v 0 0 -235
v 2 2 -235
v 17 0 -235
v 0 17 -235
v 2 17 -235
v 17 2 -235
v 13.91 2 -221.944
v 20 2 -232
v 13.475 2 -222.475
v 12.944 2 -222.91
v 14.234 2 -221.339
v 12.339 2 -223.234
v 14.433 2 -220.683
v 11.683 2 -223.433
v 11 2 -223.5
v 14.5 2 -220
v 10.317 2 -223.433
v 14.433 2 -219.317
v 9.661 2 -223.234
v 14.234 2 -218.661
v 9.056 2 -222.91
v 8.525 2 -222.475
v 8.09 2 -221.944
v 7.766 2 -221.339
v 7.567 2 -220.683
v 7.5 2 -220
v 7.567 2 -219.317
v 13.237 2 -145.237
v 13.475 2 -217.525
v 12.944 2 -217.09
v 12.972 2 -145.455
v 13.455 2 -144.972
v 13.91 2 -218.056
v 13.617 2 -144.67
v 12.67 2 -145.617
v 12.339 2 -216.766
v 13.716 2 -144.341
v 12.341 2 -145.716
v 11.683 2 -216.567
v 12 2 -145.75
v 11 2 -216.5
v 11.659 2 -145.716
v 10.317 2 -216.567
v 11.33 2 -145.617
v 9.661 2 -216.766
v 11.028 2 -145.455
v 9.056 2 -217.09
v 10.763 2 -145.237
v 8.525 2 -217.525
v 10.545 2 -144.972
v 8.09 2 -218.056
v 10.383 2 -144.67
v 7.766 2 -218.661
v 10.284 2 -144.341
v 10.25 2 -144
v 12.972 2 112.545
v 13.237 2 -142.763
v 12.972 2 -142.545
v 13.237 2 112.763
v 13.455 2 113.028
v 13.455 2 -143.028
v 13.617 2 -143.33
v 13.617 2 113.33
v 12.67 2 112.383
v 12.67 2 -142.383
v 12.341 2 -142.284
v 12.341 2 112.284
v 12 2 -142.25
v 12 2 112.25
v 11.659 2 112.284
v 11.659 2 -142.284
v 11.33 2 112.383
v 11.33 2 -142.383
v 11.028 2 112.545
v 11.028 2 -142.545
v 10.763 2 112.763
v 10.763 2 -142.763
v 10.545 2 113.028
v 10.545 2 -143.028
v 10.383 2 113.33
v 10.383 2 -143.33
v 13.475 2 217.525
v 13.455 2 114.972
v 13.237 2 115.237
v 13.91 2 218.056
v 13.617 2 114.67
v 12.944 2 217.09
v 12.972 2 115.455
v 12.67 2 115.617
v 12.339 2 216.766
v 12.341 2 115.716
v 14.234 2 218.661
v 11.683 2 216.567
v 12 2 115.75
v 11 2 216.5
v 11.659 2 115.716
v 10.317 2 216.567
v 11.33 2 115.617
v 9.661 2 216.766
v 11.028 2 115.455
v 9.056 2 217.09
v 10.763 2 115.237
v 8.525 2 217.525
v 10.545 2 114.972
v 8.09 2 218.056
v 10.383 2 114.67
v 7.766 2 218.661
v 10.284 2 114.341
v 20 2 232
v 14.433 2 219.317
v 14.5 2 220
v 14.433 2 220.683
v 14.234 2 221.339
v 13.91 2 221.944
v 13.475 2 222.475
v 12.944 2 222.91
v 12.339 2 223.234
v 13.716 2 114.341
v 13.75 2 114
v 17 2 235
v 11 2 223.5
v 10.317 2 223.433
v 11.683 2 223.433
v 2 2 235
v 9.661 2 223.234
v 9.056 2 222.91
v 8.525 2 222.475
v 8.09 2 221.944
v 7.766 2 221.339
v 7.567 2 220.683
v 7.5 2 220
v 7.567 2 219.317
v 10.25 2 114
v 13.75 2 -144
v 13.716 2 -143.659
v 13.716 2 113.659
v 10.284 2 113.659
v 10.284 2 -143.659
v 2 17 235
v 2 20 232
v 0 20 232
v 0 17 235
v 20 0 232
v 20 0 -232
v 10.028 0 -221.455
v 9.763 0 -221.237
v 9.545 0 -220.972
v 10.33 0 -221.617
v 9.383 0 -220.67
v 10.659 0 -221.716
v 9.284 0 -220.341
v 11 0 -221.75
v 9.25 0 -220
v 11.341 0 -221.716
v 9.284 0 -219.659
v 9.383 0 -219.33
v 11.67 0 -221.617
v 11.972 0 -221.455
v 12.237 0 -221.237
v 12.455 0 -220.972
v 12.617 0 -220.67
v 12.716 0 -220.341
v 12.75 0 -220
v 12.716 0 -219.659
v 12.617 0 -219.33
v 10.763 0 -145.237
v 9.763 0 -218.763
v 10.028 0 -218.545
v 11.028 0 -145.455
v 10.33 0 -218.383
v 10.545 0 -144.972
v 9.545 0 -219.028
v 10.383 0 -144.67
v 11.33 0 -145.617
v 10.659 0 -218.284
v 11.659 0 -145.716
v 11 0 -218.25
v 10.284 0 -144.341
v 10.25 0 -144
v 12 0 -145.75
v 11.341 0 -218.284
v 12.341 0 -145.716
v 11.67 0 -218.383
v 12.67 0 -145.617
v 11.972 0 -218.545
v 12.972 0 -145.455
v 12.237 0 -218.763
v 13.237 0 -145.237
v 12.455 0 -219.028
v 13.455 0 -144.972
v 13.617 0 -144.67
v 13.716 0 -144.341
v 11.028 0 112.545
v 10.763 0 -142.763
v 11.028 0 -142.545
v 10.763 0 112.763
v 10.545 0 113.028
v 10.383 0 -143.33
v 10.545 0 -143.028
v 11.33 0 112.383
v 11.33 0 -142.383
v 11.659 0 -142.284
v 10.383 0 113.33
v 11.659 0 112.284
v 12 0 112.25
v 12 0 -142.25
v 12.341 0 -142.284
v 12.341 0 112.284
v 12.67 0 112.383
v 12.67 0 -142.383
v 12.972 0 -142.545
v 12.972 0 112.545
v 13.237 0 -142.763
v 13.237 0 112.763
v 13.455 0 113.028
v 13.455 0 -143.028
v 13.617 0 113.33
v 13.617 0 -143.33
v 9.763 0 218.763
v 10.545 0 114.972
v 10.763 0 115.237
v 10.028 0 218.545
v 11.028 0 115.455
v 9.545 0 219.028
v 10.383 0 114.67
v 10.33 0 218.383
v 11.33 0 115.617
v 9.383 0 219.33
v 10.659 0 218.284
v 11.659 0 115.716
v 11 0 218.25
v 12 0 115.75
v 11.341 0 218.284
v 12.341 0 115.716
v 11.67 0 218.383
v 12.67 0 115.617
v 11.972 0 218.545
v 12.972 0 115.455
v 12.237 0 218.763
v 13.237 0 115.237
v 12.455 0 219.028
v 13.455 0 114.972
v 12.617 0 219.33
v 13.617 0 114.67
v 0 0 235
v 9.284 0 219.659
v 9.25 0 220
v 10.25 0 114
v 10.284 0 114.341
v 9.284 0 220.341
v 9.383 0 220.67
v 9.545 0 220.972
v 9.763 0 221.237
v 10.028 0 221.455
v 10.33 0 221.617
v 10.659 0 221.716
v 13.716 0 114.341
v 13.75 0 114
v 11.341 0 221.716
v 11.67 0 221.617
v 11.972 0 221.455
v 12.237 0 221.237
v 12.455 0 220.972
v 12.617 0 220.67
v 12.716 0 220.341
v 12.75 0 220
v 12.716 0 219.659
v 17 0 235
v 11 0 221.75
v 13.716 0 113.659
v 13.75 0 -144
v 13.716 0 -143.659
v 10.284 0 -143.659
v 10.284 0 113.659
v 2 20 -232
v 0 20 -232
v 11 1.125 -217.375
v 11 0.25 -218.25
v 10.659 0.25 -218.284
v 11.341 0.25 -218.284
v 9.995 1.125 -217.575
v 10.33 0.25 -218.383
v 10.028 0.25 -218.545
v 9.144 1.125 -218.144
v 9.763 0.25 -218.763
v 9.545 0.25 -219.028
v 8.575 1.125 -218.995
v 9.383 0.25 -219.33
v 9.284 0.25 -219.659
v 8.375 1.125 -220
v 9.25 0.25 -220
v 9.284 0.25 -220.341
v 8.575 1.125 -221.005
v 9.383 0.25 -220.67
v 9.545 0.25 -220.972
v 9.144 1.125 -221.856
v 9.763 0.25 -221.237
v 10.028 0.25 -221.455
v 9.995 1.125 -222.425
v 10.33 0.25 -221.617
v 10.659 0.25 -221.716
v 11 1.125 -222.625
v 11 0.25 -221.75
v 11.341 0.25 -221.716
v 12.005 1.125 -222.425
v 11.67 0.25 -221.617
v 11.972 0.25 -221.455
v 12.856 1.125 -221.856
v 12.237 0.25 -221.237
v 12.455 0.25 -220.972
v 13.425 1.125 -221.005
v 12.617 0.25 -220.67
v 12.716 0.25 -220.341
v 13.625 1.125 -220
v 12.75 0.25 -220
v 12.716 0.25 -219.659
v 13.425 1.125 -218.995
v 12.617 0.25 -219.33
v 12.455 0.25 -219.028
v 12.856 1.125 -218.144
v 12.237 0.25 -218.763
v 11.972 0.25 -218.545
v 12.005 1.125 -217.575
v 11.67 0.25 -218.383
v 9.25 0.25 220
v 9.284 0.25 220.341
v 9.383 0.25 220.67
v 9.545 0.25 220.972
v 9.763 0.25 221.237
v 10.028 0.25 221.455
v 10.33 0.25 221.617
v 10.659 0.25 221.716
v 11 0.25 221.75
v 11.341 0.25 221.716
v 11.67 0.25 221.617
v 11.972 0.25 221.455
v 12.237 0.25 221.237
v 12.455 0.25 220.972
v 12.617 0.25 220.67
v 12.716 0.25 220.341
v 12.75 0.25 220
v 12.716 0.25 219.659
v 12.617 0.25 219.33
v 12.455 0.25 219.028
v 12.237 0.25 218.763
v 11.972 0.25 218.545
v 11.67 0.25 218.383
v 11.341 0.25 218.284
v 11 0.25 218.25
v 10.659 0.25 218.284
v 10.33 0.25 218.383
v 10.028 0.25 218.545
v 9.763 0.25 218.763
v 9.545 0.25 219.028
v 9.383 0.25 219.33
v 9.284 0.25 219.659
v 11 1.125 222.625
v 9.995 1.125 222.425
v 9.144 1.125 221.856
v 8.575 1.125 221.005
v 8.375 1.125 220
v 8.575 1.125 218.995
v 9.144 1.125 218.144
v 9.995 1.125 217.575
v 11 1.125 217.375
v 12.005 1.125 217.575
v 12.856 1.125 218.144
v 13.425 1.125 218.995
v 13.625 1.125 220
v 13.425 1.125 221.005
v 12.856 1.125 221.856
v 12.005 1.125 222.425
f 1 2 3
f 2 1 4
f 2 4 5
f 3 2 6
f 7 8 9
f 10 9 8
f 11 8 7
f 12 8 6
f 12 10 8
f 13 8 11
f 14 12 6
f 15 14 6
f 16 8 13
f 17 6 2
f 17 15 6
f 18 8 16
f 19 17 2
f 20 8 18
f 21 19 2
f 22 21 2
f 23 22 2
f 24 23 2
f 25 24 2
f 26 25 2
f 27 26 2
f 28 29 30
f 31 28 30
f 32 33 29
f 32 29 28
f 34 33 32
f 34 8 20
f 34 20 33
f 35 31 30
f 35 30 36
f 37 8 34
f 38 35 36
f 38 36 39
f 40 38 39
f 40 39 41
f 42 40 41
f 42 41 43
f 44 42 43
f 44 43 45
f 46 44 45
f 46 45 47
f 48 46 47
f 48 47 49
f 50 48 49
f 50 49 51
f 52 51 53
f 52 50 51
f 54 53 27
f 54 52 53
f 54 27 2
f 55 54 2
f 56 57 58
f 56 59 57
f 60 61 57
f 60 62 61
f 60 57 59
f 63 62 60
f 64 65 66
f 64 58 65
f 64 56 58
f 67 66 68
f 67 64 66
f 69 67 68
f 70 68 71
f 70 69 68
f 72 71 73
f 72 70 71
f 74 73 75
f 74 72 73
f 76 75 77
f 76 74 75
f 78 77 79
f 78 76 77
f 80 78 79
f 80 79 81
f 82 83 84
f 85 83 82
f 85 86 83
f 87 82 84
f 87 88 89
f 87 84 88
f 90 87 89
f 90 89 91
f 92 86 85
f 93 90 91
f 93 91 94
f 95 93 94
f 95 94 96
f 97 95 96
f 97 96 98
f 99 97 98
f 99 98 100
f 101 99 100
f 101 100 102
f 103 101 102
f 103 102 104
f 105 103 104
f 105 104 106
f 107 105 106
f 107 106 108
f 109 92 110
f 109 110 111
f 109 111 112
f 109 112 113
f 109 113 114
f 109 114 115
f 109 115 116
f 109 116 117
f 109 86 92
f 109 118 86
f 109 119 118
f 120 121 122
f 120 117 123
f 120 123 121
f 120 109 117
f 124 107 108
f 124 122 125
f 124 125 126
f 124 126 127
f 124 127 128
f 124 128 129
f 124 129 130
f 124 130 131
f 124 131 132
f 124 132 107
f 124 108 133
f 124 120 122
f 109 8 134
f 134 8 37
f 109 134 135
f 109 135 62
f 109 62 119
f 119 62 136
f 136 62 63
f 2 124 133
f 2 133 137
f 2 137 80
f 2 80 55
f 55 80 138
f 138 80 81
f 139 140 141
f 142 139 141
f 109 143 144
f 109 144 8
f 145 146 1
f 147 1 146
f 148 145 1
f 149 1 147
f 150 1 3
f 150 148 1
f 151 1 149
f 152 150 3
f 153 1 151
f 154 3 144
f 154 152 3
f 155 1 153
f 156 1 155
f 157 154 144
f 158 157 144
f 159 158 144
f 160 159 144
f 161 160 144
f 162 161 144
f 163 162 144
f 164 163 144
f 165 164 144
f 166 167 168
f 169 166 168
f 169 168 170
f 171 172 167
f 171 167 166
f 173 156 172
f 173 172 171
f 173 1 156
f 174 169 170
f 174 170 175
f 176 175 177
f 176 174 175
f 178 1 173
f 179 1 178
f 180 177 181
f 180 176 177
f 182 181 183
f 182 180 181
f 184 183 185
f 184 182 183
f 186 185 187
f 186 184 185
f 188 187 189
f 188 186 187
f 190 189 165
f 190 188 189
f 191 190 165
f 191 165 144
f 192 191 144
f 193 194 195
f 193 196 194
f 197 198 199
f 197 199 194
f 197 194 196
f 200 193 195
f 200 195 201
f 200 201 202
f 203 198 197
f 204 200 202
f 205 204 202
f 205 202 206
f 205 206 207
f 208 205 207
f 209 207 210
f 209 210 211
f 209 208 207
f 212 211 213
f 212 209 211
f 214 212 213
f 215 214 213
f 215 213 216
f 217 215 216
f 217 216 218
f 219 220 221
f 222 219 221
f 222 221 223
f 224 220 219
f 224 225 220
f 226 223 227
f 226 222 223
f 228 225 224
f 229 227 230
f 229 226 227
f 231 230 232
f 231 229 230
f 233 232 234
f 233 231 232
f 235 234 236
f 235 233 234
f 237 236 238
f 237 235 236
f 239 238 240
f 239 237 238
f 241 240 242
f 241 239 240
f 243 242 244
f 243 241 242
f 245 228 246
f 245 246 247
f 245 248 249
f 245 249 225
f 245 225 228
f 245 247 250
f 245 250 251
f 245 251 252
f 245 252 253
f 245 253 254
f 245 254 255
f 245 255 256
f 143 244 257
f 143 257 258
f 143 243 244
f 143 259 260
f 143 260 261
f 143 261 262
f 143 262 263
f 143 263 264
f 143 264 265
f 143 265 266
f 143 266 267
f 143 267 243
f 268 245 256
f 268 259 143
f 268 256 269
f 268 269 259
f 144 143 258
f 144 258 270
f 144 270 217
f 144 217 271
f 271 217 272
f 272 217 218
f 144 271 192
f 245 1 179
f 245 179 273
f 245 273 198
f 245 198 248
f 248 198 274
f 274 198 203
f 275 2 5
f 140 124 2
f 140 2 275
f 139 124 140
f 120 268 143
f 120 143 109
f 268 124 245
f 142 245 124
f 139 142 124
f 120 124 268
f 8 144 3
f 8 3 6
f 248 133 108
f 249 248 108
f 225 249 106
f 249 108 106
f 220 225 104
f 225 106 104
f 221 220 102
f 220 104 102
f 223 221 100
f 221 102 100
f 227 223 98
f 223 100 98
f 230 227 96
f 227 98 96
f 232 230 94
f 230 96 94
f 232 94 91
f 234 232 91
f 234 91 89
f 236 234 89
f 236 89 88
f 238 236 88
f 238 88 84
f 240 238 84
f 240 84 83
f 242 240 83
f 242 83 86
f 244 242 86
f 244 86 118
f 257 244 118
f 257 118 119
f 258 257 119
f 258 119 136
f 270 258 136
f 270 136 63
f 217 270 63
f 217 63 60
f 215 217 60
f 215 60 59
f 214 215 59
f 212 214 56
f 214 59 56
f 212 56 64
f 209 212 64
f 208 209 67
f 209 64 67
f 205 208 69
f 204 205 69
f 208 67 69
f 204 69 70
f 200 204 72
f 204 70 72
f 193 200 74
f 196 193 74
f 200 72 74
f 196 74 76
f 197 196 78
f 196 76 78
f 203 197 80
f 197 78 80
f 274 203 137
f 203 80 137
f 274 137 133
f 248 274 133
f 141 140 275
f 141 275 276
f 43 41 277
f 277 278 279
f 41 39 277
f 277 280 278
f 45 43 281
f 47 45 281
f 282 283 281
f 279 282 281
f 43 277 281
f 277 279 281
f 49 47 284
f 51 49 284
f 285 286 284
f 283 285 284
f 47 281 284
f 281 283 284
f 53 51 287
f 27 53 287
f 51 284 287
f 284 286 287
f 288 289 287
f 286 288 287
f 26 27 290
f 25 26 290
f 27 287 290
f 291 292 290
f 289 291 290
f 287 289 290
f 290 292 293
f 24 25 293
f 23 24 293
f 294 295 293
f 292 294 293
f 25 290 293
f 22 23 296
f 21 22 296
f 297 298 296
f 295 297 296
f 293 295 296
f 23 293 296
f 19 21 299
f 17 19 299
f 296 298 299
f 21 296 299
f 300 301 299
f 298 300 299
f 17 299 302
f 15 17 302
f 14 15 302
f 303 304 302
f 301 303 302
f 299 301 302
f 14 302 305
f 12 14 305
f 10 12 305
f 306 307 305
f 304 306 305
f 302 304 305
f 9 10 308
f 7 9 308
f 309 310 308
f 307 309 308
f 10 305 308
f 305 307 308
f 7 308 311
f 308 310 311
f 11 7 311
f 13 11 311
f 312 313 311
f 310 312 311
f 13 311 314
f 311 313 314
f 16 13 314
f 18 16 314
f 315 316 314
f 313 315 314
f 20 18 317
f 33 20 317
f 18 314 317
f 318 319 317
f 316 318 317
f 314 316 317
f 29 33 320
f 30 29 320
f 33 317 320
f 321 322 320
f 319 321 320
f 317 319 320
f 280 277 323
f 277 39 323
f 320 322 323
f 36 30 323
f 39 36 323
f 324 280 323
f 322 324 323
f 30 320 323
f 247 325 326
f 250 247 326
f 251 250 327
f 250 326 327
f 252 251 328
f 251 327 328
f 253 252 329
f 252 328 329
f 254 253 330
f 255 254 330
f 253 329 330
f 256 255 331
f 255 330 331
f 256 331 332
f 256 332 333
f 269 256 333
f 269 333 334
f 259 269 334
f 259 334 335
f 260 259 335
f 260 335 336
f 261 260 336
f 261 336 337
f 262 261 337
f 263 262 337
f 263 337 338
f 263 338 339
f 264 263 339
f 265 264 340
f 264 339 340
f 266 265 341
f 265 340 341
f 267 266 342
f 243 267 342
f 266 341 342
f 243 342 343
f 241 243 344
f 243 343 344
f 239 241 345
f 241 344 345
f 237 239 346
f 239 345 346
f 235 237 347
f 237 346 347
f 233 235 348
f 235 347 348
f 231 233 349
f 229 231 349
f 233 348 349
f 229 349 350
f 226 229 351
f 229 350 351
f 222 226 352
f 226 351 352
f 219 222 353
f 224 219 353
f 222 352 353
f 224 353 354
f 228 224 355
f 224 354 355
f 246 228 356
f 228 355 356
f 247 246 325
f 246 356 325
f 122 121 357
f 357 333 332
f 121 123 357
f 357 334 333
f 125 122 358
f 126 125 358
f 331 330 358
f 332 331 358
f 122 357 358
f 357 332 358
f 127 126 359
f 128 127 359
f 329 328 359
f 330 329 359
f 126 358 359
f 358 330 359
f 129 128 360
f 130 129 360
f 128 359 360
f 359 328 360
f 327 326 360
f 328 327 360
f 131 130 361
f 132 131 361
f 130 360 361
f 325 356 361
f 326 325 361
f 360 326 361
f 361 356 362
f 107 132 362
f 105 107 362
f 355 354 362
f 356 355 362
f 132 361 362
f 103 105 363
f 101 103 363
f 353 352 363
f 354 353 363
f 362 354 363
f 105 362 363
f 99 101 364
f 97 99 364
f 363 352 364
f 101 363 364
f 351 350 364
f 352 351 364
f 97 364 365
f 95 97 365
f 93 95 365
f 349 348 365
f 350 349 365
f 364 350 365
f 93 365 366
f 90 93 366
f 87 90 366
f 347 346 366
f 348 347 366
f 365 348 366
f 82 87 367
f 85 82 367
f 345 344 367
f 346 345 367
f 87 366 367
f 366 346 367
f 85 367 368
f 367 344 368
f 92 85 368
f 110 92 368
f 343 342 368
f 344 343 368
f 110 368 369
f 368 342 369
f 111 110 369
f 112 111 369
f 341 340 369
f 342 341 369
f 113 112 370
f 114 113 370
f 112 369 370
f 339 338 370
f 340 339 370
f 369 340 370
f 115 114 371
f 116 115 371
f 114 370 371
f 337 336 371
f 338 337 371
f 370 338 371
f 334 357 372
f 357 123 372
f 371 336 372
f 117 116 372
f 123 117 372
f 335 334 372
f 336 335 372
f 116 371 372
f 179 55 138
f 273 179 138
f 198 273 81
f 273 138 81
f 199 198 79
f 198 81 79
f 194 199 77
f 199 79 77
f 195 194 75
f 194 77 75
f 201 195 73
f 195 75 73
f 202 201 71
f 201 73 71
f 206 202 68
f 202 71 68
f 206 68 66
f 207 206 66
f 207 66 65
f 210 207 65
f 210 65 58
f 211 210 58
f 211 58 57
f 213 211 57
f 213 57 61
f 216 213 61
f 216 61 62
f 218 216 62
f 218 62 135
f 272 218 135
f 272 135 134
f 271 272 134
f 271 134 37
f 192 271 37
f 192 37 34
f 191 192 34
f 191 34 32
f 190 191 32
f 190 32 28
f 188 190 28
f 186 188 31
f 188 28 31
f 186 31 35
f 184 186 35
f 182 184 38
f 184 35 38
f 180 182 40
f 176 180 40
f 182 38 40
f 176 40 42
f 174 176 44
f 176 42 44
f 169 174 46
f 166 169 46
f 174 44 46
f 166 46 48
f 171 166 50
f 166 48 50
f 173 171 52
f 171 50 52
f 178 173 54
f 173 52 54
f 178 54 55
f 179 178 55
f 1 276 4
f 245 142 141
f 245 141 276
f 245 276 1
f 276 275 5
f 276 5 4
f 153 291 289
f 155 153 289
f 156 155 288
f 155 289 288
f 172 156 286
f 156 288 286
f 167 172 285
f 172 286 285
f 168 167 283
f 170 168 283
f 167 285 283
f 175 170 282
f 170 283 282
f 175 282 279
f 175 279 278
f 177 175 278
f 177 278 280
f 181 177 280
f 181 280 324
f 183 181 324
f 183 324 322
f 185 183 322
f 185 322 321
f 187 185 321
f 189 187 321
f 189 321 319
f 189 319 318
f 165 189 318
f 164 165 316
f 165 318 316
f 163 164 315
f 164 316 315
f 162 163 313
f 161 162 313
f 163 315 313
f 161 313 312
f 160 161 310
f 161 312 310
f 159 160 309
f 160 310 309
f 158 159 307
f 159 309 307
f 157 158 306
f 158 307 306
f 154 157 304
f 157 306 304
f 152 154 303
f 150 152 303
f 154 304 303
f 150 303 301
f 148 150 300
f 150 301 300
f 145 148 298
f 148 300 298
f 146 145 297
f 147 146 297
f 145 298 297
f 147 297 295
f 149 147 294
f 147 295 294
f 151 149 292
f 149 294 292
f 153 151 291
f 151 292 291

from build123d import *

# Parameters (mm, degrees)
BOSS_EXTRUDE1_DEPTH = 235
SKETCH3_R           = 1.75
CUT_EXTRUDE2_DEPTH  = 237.535409611
CHAMFER1_SIZE       = 3
SKETCH4_R           = 1.75
CUT_EXTRUDE3_DEPTH  = 237.535409611


with BuildPart() as part:
    # Sketch1 → Boss-Extrude1 (new, symmetric)
    with BuildSketch(Plane.XY):
        Polygon((0, 0), (20, 0), (20, 2), (2, 2), (2, 20), (0, 20), align=None)
    extrude(amount=BOSS_EXTRUDE1_DEPTH, both=True)

    # Cut-Extrude1 cone 1 section (through the dimple's axis) → Cut-Extrude1 (revolve, cut)
    with BuildSketch(Plane(origin=(11, 2, -220), x_dir=(0, 0, 1), z_dir=(1, 0, 0))):
        Polygon((0, 0), (3.5, 0), (0, 3.5), align=None)
    revolve(axis=Axis((11, 2, -220), (0, -1, 0)), mode=Mode.SUBTRACT)

    # Cut-Extrude1 cone 2 section (through the dimple's axis) → Cut-Extrude1 cone 2 (revolve, cut)
    with BuildSketch(Plane(origin=(11, 2, 220), x_dir=(0, 0, 1), z_dir=(1, 0, 0))):
        Polygon((0, 0), (3.5, 0), (0, 3.5), align=None)
    revolve(axis=Axis((11, 2, 220), (0, -1, 0)), mode=Mode.SUBTRACT)

    # Sketch3 → Cut-Extrude2 (cut, through all)
    with BuildSketch(Plane(origin=(0, 2, 0), x_dir=(1, 0, 0), z_dir=(0, 1, 0))):
        with Locations(Location((11, -220, 0), (0, 0, 180))):
            Circle(SKETCH3_R)
        with Locations(Location((11, 220, 0), (0, 0, 180))):
            Circle(SKETCH3_R)
    extrude(amount=-CUT_EXTRUDE2_DEPTH, mode=Mode.SUBTRACT)

    # Chamfer1
    chamfer1_edges = [part.edges().sort_by_distance(p)[0] for p in [
        (20, 1, 235),
        (1, 20, 235),
        (1, 20, -235),
        (20, 1, -235),
    ]]
    chamfer(chamfer1_edges, length=CHAMFER1_SIZE)

    # Sketch4 → Cut-Extrude3 (cut, through all)
    with BuildSketch(Plane(origin=(0, 2, 0), x_dir=(1, 0, 0), z_dir=(0, 1, 0))):
        with Locations(Location((12, 144, 0), (0, 0, 180))):
            Circle(SKETCH4_R)
        with Locations(Location((12, -114, 0), (0, 0, 180))):
            Circle(SKETCH4_R)
    extrude(amount=-CUT_EXTRUDE3_DEPTH, mode=Mode.SUBTRACT)


solid = part.part
